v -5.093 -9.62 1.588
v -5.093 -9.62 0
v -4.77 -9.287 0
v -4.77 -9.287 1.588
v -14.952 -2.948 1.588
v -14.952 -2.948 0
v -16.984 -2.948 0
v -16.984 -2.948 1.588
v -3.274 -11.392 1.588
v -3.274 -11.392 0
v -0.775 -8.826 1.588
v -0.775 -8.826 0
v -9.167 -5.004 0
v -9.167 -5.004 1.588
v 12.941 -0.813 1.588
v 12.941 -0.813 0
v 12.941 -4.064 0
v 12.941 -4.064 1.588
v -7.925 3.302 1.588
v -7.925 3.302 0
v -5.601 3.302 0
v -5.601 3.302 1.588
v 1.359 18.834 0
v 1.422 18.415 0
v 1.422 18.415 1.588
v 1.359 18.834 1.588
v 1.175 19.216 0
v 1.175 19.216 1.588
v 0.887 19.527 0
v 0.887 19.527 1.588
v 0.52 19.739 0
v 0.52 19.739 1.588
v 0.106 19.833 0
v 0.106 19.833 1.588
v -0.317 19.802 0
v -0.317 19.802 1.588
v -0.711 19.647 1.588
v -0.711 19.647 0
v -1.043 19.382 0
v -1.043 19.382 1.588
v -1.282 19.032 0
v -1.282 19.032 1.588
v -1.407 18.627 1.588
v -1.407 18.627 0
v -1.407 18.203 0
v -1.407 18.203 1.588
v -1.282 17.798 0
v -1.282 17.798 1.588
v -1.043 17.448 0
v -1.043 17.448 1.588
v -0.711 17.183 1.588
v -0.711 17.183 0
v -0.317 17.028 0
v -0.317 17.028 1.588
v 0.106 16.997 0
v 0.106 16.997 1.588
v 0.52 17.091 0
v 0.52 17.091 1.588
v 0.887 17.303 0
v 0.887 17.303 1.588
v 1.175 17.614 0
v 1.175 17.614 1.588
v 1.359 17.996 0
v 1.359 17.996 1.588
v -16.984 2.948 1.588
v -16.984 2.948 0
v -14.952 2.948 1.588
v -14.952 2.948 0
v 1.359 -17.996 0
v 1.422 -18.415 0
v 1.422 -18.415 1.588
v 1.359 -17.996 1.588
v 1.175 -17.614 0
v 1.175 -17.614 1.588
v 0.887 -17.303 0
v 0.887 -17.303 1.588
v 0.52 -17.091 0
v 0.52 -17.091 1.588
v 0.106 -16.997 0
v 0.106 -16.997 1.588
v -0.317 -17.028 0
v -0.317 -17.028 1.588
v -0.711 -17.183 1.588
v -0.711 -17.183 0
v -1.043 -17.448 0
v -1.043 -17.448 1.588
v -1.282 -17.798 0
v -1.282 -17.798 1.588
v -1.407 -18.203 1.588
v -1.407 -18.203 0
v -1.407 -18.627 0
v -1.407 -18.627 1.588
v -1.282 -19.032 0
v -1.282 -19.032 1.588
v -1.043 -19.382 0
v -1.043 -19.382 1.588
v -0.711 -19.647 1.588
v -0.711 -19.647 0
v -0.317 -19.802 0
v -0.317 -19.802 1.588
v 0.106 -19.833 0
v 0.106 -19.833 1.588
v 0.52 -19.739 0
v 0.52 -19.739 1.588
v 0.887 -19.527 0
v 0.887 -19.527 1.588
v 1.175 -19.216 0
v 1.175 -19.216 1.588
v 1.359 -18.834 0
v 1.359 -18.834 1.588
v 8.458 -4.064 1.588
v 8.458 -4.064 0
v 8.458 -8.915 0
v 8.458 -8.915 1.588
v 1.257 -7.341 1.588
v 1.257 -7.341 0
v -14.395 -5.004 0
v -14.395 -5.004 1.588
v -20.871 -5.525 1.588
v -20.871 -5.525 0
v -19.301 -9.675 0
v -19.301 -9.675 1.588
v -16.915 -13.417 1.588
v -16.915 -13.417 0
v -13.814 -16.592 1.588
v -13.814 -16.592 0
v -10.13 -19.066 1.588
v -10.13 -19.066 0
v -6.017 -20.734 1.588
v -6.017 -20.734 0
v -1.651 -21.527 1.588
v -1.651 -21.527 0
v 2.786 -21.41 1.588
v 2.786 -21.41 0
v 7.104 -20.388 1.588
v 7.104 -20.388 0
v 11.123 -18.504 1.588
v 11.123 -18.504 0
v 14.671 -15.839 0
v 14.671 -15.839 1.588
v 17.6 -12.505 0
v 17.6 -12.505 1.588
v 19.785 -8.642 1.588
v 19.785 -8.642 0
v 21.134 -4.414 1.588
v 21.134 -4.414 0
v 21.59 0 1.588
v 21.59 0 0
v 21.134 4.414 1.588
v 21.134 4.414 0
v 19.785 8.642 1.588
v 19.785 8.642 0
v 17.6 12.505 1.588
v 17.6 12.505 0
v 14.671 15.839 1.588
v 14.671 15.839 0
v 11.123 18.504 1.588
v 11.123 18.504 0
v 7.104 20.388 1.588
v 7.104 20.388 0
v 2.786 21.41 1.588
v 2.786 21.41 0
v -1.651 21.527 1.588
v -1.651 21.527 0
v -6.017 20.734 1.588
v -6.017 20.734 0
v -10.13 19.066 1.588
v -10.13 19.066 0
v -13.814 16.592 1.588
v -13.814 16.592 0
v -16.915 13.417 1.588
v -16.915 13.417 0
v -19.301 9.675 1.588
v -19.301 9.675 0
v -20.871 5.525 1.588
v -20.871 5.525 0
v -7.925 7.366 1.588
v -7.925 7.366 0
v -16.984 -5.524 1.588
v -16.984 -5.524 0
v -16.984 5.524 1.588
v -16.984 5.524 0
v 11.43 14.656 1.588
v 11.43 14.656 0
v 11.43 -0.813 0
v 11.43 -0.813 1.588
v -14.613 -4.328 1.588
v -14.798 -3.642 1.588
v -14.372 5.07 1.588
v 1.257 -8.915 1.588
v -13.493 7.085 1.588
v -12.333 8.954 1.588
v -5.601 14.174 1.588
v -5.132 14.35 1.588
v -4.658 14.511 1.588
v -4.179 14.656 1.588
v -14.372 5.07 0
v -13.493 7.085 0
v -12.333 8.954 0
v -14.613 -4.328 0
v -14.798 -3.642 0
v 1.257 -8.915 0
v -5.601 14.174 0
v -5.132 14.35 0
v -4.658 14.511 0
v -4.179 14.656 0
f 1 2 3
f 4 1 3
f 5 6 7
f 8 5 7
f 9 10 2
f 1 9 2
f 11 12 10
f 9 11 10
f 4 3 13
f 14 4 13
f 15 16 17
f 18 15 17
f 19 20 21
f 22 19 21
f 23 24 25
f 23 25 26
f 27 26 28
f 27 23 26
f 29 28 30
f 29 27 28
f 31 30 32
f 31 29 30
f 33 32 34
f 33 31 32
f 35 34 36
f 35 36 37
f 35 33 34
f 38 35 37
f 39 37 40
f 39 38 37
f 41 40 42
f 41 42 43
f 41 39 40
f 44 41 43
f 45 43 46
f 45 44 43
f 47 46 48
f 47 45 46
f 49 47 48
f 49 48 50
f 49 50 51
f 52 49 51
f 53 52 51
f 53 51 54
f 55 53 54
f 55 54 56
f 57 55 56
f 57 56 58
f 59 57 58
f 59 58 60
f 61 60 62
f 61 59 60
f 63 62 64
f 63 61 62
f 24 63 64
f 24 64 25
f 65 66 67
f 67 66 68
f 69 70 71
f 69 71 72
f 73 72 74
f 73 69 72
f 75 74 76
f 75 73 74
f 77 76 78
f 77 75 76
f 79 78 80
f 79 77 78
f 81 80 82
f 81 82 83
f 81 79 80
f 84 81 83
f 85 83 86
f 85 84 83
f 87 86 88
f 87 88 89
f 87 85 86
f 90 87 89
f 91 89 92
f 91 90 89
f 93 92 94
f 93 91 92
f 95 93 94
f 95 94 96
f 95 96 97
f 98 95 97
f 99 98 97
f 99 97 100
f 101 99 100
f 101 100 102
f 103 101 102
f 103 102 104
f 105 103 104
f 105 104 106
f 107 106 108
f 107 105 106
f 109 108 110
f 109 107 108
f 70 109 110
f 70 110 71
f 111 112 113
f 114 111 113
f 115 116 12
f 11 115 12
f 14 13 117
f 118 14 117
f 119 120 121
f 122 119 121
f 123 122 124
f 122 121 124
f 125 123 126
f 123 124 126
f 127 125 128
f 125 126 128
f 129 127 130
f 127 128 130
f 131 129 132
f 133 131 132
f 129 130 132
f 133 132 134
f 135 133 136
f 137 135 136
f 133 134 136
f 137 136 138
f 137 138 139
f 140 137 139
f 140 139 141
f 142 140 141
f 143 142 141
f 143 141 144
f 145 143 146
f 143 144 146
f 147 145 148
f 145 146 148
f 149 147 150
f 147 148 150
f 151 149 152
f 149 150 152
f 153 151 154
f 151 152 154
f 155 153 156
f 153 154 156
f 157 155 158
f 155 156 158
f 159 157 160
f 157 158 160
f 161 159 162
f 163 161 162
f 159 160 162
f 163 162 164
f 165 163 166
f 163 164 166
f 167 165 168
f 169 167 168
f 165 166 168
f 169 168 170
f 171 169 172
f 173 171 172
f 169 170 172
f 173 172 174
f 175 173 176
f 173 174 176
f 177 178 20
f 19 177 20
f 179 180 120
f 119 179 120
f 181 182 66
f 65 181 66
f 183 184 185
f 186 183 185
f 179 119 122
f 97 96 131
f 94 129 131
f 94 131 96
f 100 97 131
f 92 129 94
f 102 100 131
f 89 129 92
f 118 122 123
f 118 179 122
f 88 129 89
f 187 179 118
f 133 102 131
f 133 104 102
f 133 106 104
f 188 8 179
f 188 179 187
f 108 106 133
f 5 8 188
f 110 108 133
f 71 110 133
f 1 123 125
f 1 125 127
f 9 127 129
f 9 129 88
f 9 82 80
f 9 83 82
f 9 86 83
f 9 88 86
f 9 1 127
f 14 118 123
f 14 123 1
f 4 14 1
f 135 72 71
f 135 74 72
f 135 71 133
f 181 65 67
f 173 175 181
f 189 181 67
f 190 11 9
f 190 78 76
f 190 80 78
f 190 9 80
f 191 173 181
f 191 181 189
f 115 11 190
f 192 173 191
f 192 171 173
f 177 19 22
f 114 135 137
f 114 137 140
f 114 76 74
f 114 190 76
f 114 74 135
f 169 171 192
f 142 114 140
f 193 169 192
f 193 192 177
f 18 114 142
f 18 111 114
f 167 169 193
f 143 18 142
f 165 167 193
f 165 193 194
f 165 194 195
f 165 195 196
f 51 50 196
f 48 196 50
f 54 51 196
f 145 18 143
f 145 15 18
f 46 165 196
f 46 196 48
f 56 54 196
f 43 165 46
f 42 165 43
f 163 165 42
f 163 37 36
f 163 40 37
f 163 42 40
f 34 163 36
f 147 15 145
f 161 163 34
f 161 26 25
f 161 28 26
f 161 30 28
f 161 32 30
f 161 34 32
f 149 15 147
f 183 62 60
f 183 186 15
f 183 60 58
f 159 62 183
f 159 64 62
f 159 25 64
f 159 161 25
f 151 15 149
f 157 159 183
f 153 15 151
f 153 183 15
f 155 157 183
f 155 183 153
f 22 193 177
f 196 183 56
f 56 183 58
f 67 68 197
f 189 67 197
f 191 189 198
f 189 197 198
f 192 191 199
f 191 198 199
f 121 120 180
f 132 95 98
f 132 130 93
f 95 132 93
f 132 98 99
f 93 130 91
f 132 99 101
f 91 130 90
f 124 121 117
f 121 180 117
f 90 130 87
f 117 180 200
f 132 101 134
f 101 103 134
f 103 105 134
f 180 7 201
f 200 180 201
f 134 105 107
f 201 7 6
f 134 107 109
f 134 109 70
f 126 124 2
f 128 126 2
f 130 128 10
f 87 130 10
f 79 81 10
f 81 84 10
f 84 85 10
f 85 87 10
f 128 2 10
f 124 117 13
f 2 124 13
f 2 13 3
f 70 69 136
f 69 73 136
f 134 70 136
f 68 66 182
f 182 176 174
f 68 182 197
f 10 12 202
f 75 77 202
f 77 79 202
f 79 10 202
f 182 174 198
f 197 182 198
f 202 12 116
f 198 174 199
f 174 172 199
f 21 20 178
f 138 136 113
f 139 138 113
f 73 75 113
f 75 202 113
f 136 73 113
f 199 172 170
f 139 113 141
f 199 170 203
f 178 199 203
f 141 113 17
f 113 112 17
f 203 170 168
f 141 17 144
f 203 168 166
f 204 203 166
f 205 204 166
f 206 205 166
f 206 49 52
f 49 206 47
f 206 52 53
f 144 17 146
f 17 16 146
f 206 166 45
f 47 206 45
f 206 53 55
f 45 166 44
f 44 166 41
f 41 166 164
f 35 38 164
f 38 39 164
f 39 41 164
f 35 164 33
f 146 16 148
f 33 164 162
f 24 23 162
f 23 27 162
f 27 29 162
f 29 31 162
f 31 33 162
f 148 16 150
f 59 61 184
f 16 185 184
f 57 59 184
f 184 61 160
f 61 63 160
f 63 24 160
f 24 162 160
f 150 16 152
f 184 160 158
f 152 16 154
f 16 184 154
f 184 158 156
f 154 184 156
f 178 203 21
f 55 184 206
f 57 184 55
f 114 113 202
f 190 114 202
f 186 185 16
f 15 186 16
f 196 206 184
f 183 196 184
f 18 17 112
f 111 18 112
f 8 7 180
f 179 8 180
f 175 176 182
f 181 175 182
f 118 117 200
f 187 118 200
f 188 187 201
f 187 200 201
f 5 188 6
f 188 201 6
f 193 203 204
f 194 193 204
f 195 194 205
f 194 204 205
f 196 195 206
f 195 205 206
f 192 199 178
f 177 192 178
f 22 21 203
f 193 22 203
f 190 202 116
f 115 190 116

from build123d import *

# Parameters (mm, degrees)
SKETCH1_R           = 1.4224
BOSS_EXTRUDE1_DEPTH = 1.5875


with BuildPart() as part:
    # Sketch1 → Boss-Extrude1 (new body)
    with BuildSketch(Plane.XY):
        with BuildLine():
            Line((-14.952058744, -2.948480848), (-16.984058744, -2.948480848))
            Line((-16.984058744, -2.948480848), (-16.984058744, -5.5245))
            Line((-16.984058744, -5.5245), (-20.871224203, -5.5245))
            ThreePointArc((-20.871224203, -5.5245), (21.59, 0), (-20.871224203, 5.5245))
            Line((-20.871224203, 5.5245), (-16.984058744, 5.5245))
            Line((-16.984058744, 5.5245), (-16.984058744, 2.948480848))
            Line((-16.984058744, 2.948480848), (-14.952058744, 2.948480848))
            ThreePointArc((-14.952058744, 2.948480848), (-13.968818521, 6.093415226), (-12.332576282, 8.9535))
            Line((-12.332576282, 8.9535), (-7.9248, 7.366))
            Line((-7.9248, 7.366), (-7.9248, 3.302))
            Line((-7.9248, 3.302), (-5.6007, 3.302))
            Line((-5.6007, 3.302), (-5.6007, 14.173558463))
            ThreePointArc((-5.6007, 14.173558463), (-4.895856129, 14.43219293), (-4.179129857, 14.6558))
            Line((-4.179129857, 14.6558), (4.179129857, 14.6558))
            Line((4.179129857, 14.6558), (11.43, 14.6558))
            Line((11.43, 14.6558), (11.43, -0.8128))
            Line((11.43, -0.8128), (12.9413, -0.8128))
            Line((12.9413, -0.8128), (12.9413, -4.064))
            Line((12.9413, -4.064), (8.4582, -4.064))
            Line((8.4582, -4.064), (8.4582, -8.9154))
            Line((8.4582, -8.9154), (1.2573, -8.9154))
            Line((1.2573, -8.9154), (1.2573, -7.3406))
            Line((1.2573, -7.3406), (-0.7747, -8.8265))
            Line((-0.7747, -8.8265), (-3.273729572, -11.3919))
            Line((-3.273729572, -11.3919), (-5.093162196, -9.619538602))
            Line((-5.093162196, -9.619538602), (-4.769706241, -9.287492148))
            Line((-4.769706241, -9.287492148), (-9.167166743, -5.0038))
            Line((-9.167166743, -5.0038), (-14.395123673, -5.0038))
            ThreePointArc((-14.395123673, -5.0038), (-14.709533071, -3.985879682), (-14.952058744, -2.948480848))
        make_face()
        with Locations((0, 18.415)):
            Circle(SKETCH1_R, mode=Mode.SUBTRACT)
        with Locations((0, -18.415)):
            Circle(SKETCH1_R, mode=Mode.SUBTRACT)
    extrude(amount=BOSS_EXTRUDE1_DEPTH)


solid = part.part
